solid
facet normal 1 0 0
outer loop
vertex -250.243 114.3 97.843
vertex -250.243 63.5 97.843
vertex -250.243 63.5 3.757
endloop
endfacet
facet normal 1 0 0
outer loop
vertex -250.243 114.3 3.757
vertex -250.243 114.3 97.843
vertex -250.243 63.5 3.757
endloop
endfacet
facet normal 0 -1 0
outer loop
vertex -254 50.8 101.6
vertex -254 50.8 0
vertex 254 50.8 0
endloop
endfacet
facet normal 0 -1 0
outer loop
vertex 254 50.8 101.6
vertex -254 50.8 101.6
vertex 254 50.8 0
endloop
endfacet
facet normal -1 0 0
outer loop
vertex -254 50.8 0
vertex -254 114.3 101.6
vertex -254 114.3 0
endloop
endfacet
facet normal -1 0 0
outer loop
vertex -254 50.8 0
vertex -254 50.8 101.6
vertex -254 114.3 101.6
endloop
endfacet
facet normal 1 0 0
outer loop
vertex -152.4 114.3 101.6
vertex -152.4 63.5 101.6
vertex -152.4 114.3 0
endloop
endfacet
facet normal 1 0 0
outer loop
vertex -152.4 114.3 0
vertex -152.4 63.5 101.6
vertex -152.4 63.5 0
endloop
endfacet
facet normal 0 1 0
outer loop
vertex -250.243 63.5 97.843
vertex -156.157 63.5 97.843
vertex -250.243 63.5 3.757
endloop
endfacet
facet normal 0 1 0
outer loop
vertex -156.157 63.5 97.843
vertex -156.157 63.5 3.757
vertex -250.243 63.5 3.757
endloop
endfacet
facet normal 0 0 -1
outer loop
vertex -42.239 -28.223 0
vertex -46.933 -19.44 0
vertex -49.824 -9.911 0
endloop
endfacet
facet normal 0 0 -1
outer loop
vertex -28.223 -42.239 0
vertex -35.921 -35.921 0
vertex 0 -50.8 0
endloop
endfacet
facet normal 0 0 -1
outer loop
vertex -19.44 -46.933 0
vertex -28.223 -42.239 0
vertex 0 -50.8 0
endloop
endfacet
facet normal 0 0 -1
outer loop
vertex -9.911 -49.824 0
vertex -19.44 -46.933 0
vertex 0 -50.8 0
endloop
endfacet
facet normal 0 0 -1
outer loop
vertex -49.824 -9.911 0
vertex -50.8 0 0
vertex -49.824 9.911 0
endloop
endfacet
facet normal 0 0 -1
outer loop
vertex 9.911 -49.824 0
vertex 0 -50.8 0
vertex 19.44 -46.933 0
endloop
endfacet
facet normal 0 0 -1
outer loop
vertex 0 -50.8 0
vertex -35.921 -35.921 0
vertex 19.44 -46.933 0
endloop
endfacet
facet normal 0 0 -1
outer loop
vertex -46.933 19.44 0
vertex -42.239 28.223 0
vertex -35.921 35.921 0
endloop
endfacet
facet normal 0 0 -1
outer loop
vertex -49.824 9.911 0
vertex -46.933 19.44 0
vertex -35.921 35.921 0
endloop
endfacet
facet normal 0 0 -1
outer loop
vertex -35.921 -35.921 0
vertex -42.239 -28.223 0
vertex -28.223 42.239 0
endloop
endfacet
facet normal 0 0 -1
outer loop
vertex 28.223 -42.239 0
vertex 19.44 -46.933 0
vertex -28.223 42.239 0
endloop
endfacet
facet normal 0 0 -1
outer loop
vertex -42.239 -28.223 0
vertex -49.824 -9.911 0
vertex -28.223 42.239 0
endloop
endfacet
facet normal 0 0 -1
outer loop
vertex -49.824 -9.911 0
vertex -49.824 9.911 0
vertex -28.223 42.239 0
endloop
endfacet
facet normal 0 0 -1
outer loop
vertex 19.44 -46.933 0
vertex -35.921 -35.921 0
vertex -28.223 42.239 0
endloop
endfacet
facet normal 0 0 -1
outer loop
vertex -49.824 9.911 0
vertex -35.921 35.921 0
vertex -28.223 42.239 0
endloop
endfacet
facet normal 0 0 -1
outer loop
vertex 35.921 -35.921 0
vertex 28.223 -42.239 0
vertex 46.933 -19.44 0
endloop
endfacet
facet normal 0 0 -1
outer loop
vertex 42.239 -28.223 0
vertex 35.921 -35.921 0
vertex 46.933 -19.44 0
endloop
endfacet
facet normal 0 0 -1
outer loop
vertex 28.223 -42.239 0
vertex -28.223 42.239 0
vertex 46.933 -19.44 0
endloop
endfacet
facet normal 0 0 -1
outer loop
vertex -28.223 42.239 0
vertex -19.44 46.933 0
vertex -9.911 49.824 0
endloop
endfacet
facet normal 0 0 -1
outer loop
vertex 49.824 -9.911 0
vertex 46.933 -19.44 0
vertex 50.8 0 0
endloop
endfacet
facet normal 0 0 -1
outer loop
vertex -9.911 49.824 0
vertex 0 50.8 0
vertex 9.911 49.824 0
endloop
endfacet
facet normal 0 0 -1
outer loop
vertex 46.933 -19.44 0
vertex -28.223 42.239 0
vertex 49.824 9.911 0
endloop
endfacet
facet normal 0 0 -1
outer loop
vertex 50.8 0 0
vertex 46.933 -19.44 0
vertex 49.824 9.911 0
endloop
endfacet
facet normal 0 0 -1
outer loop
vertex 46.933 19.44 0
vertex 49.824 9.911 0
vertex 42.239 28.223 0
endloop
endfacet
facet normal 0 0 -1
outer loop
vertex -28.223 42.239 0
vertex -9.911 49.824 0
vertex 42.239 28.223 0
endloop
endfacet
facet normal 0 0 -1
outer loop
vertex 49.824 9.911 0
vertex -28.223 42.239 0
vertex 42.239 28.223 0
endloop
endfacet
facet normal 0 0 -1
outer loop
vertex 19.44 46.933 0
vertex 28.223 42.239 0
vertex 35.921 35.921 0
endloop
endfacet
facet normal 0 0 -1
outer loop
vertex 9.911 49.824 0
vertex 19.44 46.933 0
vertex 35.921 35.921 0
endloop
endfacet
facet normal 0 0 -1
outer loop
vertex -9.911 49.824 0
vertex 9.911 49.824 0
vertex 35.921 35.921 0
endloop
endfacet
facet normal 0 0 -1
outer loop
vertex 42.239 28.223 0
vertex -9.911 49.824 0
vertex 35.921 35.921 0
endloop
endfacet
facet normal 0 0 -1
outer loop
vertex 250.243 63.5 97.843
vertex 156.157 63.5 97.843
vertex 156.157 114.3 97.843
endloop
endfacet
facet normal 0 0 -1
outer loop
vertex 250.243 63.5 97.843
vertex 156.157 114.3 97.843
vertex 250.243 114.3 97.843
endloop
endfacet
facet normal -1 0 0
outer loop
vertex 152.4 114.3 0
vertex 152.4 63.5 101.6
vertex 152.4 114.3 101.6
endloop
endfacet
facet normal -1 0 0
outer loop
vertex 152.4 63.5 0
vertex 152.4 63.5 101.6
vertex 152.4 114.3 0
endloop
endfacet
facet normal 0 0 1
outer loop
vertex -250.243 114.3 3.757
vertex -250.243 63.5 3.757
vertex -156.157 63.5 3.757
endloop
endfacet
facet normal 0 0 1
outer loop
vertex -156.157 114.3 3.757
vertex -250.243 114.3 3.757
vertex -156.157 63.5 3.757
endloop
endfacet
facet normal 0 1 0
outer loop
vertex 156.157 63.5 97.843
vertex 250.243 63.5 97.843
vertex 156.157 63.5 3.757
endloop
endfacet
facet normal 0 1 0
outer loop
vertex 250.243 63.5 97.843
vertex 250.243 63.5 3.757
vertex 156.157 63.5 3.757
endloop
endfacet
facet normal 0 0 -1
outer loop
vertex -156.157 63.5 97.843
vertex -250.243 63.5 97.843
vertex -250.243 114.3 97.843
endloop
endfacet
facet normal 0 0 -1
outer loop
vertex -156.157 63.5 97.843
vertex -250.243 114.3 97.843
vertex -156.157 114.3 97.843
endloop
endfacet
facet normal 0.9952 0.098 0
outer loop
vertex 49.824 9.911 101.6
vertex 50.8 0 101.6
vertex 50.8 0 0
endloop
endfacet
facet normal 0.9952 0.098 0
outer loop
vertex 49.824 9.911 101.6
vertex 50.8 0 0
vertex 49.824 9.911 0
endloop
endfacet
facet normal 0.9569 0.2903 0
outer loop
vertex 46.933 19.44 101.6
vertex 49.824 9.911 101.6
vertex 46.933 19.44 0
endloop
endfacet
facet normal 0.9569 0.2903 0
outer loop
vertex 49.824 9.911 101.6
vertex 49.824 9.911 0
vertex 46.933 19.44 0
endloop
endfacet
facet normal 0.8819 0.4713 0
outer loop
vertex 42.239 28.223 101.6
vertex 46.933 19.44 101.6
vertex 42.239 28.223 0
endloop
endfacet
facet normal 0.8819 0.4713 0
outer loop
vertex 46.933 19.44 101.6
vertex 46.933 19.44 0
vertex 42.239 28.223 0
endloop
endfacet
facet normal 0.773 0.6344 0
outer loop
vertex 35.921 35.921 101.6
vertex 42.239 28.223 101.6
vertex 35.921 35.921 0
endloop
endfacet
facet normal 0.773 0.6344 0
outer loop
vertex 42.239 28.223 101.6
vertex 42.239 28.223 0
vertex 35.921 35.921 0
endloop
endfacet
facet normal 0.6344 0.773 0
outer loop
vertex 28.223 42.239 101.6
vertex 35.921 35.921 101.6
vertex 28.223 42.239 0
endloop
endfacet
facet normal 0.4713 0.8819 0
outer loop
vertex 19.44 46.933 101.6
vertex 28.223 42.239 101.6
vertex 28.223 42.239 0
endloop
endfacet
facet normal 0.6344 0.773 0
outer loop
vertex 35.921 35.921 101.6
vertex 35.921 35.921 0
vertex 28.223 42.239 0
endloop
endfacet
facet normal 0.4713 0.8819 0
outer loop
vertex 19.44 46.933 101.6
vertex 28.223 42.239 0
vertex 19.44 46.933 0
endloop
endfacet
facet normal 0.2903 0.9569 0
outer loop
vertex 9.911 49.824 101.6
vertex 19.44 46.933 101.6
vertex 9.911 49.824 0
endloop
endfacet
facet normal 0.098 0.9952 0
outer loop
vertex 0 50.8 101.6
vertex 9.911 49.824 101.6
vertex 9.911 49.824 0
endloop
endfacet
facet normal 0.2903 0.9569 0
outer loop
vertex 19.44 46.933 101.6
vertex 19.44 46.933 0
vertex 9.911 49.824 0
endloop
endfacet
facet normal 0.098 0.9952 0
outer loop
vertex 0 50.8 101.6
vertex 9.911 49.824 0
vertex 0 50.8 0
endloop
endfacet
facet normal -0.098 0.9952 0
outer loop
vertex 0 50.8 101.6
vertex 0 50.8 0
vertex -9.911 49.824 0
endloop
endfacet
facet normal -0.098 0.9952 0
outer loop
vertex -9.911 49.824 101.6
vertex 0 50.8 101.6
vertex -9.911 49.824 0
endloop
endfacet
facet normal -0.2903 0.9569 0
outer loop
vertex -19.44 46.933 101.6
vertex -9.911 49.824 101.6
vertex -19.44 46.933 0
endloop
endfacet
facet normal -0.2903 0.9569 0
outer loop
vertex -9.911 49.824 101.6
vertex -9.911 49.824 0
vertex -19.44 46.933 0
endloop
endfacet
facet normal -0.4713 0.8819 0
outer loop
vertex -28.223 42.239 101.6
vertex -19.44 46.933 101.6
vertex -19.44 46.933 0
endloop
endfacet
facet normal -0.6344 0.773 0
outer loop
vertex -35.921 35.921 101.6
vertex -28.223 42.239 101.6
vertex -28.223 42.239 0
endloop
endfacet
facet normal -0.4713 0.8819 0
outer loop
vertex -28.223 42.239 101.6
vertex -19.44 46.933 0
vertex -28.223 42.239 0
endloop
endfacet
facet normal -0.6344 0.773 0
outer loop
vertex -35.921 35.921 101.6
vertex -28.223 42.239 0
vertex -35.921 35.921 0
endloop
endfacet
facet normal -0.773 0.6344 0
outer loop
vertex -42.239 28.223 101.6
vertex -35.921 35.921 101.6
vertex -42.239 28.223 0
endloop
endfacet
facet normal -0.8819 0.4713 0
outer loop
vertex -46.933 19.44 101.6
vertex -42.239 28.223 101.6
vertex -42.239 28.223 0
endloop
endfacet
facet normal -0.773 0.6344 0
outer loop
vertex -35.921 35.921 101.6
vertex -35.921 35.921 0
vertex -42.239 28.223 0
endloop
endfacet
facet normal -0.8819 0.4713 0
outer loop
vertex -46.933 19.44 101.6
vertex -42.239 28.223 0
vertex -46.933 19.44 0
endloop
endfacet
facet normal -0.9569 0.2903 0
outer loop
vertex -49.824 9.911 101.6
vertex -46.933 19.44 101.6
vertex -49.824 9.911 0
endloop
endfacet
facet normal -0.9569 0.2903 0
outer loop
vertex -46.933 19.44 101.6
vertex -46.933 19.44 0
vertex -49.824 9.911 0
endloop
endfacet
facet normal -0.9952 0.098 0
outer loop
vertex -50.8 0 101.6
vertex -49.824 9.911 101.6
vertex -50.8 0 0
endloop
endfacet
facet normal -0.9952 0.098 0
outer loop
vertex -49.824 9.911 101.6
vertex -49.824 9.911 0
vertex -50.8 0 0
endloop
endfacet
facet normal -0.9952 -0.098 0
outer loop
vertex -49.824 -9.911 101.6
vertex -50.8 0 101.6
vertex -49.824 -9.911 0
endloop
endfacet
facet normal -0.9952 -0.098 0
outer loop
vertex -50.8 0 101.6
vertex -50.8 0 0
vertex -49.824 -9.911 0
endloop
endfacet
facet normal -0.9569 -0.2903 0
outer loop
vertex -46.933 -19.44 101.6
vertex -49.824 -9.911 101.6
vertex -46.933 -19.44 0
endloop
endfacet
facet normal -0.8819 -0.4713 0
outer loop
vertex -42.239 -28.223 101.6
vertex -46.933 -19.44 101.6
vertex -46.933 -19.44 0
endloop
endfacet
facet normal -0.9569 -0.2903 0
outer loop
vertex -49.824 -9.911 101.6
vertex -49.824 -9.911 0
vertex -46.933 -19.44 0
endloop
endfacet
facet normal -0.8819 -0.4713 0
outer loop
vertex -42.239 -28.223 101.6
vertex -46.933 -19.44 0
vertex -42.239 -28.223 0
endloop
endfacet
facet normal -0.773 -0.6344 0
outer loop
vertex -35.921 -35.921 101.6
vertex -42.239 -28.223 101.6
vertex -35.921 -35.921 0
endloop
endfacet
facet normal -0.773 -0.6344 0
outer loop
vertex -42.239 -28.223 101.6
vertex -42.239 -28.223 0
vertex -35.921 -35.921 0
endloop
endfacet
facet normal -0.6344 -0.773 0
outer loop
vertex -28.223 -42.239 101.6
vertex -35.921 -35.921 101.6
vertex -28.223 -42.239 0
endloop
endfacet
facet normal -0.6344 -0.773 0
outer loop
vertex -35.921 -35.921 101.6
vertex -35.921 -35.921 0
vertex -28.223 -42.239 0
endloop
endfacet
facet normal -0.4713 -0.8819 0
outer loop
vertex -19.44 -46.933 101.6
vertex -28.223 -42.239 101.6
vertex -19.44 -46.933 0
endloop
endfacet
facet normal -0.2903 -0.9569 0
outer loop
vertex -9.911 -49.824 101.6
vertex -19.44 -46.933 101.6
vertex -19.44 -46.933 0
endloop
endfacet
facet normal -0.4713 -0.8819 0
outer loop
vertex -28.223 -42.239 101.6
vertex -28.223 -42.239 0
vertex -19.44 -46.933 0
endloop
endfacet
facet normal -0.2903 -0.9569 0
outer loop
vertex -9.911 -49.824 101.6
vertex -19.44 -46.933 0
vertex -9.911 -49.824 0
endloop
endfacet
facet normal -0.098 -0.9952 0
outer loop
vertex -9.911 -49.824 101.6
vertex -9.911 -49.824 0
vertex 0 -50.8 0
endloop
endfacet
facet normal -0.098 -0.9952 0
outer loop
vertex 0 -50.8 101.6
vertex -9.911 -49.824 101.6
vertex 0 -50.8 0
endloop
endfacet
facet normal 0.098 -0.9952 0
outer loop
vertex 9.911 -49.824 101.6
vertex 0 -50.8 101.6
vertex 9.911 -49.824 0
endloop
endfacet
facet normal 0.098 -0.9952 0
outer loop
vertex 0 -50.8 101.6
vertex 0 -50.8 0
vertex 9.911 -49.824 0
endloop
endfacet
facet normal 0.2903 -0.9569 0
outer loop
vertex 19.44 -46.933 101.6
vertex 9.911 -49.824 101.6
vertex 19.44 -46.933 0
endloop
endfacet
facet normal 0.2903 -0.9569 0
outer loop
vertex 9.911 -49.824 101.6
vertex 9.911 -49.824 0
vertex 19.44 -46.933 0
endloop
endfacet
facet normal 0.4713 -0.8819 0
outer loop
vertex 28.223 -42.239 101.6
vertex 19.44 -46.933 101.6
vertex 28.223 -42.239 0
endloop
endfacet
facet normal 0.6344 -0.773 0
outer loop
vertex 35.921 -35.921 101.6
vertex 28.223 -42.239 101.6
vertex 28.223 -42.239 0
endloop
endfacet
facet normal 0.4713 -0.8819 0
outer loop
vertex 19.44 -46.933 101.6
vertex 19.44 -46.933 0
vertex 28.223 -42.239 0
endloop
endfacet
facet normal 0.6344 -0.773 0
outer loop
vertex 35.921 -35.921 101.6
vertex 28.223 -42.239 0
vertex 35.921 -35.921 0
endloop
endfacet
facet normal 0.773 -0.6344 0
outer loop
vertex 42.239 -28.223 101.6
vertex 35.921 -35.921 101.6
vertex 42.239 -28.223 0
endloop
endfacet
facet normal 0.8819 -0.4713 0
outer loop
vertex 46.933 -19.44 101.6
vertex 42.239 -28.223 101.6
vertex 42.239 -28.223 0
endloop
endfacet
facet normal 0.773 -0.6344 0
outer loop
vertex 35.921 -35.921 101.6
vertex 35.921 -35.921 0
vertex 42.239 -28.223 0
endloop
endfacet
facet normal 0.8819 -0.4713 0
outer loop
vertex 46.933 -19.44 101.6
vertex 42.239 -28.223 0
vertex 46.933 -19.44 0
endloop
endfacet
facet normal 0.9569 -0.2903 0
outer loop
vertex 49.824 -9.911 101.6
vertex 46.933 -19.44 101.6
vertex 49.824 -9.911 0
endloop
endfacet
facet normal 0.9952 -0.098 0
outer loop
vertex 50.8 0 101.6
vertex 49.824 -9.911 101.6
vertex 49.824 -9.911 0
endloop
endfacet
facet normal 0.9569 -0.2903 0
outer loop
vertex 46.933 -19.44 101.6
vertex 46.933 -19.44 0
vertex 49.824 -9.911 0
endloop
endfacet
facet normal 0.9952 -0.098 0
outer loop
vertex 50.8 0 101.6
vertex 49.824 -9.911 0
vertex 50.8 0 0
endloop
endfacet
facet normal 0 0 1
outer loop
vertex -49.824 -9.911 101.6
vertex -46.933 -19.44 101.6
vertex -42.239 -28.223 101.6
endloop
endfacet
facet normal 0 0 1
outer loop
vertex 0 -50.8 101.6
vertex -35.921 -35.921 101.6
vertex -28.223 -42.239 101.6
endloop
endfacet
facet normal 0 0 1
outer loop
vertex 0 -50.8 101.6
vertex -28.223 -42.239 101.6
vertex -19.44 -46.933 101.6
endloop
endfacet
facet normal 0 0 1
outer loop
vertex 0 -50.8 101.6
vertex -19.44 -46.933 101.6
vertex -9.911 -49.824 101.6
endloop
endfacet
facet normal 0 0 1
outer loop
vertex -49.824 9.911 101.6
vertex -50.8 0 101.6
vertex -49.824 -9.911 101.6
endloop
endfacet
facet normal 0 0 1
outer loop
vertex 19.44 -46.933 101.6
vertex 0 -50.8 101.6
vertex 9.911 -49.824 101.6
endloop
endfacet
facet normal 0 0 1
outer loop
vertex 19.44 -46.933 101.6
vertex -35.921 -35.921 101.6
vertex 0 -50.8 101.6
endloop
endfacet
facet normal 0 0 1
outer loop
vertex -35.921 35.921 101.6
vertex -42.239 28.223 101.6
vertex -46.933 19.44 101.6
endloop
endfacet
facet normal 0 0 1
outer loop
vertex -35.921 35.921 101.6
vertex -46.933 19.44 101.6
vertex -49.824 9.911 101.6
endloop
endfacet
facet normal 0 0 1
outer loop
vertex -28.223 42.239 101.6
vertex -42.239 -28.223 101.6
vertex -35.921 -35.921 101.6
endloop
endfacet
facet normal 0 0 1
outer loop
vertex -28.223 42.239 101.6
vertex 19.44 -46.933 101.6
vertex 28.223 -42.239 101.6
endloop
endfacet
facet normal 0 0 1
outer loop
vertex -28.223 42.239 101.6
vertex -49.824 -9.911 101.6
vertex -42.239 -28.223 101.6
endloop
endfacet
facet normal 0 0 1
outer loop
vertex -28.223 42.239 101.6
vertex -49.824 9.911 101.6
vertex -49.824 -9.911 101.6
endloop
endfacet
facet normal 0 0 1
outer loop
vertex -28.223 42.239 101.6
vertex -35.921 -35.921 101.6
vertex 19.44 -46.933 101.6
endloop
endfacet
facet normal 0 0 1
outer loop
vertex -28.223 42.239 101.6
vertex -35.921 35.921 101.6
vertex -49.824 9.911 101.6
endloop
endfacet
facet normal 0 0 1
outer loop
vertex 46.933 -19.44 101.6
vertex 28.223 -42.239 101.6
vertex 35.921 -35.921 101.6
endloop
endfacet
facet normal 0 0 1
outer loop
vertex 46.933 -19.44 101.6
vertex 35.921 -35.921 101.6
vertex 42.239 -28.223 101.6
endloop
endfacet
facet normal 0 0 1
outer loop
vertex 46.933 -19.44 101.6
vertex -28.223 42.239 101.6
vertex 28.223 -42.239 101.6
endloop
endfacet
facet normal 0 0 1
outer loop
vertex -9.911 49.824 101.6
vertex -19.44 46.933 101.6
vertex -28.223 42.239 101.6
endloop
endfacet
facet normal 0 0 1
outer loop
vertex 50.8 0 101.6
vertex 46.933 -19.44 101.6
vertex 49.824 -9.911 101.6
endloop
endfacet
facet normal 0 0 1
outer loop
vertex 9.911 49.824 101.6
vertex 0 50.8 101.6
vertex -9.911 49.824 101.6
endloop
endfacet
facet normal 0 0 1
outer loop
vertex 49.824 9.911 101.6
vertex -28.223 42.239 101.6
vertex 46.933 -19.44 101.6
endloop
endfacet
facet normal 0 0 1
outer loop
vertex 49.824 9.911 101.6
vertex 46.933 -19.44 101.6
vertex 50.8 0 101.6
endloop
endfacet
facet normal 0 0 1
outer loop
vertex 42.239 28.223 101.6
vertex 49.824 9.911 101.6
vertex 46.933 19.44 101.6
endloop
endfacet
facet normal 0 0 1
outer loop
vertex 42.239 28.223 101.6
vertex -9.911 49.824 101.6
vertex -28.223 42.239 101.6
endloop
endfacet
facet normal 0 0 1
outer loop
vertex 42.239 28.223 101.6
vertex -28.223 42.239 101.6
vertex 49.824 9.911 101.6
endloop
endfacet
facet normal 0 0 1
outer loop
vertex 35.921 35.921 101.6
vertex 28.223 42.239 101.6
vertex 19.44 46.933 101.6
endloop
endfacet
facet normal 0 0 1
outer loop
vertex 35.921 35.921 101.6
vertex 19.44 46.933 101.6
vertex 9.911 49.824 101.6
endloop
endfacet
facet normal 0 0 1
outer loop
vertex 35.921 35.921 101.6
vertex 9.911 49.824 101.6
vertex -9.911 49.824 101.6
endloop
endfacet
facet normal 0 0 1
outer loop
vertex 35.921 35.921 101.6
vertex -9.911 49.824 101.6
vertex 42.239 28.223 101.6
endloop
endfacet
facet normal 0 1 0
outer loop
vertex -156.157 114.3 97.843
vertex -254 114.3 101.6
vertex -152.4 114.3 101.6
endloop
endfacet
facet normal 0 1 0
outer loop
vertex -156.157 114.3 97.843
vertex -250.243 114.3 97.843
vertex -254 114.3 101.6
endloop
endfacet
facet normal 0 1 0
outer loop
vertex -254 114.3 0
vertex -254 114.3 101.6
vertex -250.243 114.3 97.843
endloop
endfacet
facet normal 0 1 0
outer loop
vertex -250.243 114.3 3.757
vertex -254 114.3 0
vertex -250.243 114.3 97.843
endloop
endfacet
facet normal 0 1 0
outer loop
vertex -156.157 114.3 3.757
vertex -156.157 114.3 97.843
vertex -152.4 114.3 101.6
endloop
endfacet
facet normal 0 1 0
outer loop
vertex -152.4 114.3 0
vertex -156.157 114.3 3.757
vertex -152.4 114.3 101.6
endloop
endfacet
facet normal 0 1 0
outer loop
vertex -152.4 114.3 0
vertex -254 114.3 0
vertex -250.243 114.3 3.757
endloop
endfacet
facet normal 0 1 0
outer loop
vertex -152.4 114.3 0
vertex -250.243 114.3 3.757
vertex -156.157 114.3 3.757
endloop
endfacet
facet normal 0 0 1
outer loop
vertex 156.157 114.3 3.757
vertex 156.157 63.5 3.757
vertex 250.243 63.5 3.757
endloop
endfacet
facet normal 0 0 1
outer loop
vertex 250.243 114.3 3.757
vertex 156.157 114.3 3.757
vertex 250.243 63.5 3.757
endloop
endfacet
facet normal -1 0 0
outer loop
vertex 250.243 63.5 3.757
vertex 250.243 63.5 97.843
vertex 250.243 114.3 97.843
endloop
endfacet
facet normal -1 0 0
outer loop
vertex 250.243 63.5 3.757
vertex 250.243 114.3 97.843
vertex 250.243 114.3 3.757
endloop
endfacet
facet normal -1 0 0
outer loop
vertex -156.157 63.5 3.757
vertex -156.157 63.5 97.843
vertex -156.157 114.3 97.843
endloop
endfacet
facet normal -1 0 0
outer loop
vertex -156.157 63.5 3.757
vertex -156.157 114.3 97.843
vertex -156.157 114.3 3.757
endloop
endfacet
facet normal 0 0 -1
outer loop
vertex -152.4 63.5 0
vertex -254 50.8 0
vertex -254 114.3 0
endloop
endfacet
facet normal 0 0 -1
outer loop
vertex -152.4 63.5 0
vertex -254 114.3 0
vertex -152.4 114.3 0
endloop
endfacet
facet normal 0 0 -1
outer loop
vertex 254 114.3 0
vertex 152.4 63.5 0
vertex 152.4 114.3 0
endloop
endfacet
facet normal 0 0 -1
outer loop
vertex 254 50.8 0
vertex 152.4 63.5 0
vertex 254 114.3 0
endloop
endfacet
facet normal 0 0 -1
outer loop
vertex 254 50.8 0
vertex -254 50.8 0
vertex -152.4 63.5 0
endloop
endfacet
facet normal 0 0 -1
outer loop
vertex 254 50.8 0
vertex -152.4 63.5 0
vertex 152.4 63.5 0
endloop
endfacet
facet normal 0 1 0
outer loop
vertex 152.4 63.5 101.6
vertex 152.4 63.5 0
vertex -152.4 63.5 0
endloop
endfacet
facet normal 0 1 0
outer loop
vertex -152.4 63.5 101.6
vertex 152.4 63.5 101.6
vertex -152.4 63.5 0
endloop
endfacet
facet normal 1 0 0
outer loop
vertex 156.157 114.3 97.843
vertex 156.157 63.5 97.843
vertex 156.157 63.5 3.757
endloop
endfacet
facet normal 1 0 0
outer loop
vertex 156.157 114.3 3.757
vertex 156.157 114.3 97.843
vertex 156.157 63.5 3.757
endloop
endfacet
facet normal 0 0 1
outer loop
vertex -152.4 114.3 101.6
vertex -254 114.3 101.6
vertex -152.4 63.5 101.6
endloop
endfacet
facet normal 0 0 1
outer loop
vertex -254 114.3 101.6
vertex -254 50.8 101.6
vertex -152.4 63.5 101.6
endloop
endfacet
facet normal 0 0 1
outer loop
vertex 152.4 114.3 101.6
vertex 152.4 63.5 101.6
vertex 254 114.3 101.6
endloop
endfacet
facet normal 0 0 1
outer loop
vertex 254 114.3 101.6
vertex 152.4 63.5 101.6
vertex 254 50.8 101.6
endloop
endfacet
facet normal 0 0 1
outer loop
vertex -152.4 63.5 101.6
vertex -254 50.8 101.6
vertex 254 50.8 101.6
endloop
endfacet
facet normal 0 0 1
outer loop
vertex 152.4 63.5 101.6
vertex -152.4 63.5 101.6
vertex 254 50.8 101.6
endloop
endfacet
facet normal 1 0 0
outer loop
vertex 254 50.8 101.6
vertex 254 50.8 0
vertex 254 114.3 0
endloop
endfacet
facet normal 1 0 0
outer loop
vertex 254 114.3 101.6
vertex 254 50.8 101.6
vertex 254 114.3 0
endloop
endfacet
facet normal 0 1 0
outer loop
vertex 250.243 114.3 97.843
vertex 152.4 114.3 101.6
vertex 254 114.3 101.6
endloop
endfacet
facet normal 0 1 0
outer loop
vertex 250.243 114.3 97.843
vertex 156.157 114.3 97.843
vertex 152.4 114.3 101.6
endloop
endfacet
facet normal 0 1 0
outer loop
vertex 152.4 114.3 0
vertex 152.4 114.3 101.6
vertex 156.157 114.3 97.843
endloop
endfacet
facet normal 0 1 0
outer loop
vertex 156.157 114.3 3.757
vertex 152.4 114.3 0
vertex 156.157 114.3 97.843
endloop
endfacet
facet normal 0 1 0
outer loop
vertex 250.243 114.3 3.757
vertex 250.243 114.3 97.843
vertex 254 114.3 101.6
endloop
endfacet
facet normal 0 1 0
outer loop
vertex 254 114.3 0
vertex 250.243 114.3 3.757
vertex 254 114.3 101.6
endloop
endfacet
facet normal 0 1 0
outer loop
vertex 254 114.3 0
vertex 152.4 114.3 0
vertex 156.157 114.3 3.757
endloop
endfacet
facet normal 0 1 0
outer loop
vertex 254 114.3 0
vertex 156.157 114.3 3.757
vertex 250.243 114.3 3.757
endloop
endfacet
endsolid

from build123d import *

# Parameters (mm, degrees)
BOSS_EXTRUDE1_DEPTH   = 101.6
SKETCH1_R             = 50.8
BOSS_EXTRUDE1_2_DEPTH = 101.6
SKETCH2_W             = 101.6
SKETCH2_H             = 101.6
SKETCH2_W_2           = 94.085415818
SKETCH2_H_2           = 94.085415818
BOSS_EXTRUDE2_DEPTH   = 50.8


with BuildPart() as part:
    # Sketch1 → Boss-Extrude1 (new body)
    with BuildSketch(Plane.XY):
        Polygon((-254, 63.5), (-254, 50.8), (0, 50.8), (254, 50.8), (254, 63.5), align=None)
    extrude(amount=BOSS_EXTRUDE1_DEPTH)

    # Sketch2 → Boss-Extrude2 (add)
    with BuildSketch(Plane(origin=(0, 63.5, 0), x_dir=(1, 0, 0), z_dir=(0, 1, 0))):
        with Locations((-203.2, -50.8)):
            Rectangle(SKETCH2_W, SKETCH2_H)
        with Locations((-203.2, -50.8)):
            Rectangle(SKETCH2_W_2, SKETCH2_H_2, mode=Mode.SUBTRACT)
        with Locations((203.2, -50.8)):
            Rectangle(SKETCH2_W, SKETCH2_H)
        with Locations((203.2, -50.8)):
            Rectangle(SKETCH2_W_2, SKETCH2_H_2, mode=Mode.SUBTRACT)
    extrude(amount=BOSS_EXTRUDE2_DEPTH)


with BuildPart() as body_2:
    # Sketch1 → Boss-Extrude1 2 (new body)
    with BuildSketch(Plane.XY):
        Circle(SKETCH1_R)
    extrude(amount=BOSS_EXTRUDE1_2_DEPTH)


solid = Compound([part.part, body_2.part])
